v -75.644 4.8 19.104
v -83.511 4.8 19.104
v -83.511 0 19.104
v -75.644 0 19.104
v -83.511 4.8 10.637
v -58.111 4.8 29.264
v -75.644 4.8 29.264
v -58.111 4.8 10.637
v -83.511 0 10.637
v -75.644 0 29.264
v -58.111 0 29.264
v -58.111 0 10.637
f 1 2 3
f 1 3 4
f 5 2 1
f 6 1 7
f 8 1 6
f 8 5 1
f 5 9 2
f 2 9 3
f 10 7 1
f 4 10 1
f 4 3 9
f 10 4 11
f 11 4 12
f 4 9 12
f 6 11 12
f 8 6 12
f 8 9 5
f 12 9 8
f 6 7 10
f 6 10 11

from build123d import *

# Parameters (mm, degrees)
SKETCH1_W           = 33.866666666
SKETCH1_H           = 25.4
BOSS_EXTRUDE1_DEPTH = 4.800000052
SKETCH3_W           = 16.333333517
SKETCH3_H           = 16.933333333
CUT_EXTRUDE1_DEPTH  = 99.901754472
SKETCH4_OUTSIDE_W   = 44.386
SKETCH4_OUTSIDE_H   = 35.92
CUT_EXTRUDE3_DEPTH  = 99.901754472
CUT_EXTRUDE4_DEPTH  = 97.639789204


with BuildPart() as part:
    # Sketch1 → Boss-Extrude1 (new body)
    with BuildSketch(Plane(origin=(0, 0, 0), x_dir=(1, 0, 0), z_dir=(0, 1, 0))):
        with Locations((-75.043974065, -23.337368951)):
            Rectangle(SKETCH1_W, SKETCH1_H)
    extrude(amount=BOSS_EXTRUDE1_DEPTH)

    # Sketch3 → Cut-Extrude1 (cut, through all)
    with BuildSketch(Plane(origin=(0, 4.800000052, 0), x_dir=(1, 0, 0), z_dir=(0, 1, 0))):
        with Locations((-83.81064064, -27.570702285)):
            Rectangle(SKETCH3_W, SKETCH3_H)
    extrude(amount=-CUT_EXTRUDE1_DEPTH, mode=Mode.SUBTRACT)

    # Sketch4 outside → Cut-Extrude3 (cut, through all)
    with BuildSketch(Plane(origin=(0, 4.800000052, 0), x_dir=(1, 0, 0), z_dir=(0, 1, 0))):
        with Locations((-75.044, -23.337)):
            Rectangle(SKETCH4_OUTSIDE_W, SKETCH4_OUTSIDE_H)
        Polygon((-91.977307398, -19.104035618), (-75.643973881, -19.104035618), (-75.643973881, -29.264035618), (-58.110640732, -29.264035618), (-58.110640732, -10.637368951), (-91.977307398, -10.637368951), align=None, mode=Mode.SUBTRACT)
    extrude(amount=-CUT_EXTRUDE3_DEPTH, mode=Mode.SUBTRACT)

    # Sketch5 → Cut-Extrude4 (cut, through all)
    with BuildSketch(Plane.XZ):
        Polygon((-91.977307398, 10.637368951), (-83.510640732, 10.637368951), (-83.510640732, 16.093970394), (-83.510640732, 19.104035618), (-91.977307398, 19.104035618), align=None)
    extrude(amount=-CUT_EXTRUDE4_DEPTH, mode=Mode.SUBTRACT)


solid = part.part
